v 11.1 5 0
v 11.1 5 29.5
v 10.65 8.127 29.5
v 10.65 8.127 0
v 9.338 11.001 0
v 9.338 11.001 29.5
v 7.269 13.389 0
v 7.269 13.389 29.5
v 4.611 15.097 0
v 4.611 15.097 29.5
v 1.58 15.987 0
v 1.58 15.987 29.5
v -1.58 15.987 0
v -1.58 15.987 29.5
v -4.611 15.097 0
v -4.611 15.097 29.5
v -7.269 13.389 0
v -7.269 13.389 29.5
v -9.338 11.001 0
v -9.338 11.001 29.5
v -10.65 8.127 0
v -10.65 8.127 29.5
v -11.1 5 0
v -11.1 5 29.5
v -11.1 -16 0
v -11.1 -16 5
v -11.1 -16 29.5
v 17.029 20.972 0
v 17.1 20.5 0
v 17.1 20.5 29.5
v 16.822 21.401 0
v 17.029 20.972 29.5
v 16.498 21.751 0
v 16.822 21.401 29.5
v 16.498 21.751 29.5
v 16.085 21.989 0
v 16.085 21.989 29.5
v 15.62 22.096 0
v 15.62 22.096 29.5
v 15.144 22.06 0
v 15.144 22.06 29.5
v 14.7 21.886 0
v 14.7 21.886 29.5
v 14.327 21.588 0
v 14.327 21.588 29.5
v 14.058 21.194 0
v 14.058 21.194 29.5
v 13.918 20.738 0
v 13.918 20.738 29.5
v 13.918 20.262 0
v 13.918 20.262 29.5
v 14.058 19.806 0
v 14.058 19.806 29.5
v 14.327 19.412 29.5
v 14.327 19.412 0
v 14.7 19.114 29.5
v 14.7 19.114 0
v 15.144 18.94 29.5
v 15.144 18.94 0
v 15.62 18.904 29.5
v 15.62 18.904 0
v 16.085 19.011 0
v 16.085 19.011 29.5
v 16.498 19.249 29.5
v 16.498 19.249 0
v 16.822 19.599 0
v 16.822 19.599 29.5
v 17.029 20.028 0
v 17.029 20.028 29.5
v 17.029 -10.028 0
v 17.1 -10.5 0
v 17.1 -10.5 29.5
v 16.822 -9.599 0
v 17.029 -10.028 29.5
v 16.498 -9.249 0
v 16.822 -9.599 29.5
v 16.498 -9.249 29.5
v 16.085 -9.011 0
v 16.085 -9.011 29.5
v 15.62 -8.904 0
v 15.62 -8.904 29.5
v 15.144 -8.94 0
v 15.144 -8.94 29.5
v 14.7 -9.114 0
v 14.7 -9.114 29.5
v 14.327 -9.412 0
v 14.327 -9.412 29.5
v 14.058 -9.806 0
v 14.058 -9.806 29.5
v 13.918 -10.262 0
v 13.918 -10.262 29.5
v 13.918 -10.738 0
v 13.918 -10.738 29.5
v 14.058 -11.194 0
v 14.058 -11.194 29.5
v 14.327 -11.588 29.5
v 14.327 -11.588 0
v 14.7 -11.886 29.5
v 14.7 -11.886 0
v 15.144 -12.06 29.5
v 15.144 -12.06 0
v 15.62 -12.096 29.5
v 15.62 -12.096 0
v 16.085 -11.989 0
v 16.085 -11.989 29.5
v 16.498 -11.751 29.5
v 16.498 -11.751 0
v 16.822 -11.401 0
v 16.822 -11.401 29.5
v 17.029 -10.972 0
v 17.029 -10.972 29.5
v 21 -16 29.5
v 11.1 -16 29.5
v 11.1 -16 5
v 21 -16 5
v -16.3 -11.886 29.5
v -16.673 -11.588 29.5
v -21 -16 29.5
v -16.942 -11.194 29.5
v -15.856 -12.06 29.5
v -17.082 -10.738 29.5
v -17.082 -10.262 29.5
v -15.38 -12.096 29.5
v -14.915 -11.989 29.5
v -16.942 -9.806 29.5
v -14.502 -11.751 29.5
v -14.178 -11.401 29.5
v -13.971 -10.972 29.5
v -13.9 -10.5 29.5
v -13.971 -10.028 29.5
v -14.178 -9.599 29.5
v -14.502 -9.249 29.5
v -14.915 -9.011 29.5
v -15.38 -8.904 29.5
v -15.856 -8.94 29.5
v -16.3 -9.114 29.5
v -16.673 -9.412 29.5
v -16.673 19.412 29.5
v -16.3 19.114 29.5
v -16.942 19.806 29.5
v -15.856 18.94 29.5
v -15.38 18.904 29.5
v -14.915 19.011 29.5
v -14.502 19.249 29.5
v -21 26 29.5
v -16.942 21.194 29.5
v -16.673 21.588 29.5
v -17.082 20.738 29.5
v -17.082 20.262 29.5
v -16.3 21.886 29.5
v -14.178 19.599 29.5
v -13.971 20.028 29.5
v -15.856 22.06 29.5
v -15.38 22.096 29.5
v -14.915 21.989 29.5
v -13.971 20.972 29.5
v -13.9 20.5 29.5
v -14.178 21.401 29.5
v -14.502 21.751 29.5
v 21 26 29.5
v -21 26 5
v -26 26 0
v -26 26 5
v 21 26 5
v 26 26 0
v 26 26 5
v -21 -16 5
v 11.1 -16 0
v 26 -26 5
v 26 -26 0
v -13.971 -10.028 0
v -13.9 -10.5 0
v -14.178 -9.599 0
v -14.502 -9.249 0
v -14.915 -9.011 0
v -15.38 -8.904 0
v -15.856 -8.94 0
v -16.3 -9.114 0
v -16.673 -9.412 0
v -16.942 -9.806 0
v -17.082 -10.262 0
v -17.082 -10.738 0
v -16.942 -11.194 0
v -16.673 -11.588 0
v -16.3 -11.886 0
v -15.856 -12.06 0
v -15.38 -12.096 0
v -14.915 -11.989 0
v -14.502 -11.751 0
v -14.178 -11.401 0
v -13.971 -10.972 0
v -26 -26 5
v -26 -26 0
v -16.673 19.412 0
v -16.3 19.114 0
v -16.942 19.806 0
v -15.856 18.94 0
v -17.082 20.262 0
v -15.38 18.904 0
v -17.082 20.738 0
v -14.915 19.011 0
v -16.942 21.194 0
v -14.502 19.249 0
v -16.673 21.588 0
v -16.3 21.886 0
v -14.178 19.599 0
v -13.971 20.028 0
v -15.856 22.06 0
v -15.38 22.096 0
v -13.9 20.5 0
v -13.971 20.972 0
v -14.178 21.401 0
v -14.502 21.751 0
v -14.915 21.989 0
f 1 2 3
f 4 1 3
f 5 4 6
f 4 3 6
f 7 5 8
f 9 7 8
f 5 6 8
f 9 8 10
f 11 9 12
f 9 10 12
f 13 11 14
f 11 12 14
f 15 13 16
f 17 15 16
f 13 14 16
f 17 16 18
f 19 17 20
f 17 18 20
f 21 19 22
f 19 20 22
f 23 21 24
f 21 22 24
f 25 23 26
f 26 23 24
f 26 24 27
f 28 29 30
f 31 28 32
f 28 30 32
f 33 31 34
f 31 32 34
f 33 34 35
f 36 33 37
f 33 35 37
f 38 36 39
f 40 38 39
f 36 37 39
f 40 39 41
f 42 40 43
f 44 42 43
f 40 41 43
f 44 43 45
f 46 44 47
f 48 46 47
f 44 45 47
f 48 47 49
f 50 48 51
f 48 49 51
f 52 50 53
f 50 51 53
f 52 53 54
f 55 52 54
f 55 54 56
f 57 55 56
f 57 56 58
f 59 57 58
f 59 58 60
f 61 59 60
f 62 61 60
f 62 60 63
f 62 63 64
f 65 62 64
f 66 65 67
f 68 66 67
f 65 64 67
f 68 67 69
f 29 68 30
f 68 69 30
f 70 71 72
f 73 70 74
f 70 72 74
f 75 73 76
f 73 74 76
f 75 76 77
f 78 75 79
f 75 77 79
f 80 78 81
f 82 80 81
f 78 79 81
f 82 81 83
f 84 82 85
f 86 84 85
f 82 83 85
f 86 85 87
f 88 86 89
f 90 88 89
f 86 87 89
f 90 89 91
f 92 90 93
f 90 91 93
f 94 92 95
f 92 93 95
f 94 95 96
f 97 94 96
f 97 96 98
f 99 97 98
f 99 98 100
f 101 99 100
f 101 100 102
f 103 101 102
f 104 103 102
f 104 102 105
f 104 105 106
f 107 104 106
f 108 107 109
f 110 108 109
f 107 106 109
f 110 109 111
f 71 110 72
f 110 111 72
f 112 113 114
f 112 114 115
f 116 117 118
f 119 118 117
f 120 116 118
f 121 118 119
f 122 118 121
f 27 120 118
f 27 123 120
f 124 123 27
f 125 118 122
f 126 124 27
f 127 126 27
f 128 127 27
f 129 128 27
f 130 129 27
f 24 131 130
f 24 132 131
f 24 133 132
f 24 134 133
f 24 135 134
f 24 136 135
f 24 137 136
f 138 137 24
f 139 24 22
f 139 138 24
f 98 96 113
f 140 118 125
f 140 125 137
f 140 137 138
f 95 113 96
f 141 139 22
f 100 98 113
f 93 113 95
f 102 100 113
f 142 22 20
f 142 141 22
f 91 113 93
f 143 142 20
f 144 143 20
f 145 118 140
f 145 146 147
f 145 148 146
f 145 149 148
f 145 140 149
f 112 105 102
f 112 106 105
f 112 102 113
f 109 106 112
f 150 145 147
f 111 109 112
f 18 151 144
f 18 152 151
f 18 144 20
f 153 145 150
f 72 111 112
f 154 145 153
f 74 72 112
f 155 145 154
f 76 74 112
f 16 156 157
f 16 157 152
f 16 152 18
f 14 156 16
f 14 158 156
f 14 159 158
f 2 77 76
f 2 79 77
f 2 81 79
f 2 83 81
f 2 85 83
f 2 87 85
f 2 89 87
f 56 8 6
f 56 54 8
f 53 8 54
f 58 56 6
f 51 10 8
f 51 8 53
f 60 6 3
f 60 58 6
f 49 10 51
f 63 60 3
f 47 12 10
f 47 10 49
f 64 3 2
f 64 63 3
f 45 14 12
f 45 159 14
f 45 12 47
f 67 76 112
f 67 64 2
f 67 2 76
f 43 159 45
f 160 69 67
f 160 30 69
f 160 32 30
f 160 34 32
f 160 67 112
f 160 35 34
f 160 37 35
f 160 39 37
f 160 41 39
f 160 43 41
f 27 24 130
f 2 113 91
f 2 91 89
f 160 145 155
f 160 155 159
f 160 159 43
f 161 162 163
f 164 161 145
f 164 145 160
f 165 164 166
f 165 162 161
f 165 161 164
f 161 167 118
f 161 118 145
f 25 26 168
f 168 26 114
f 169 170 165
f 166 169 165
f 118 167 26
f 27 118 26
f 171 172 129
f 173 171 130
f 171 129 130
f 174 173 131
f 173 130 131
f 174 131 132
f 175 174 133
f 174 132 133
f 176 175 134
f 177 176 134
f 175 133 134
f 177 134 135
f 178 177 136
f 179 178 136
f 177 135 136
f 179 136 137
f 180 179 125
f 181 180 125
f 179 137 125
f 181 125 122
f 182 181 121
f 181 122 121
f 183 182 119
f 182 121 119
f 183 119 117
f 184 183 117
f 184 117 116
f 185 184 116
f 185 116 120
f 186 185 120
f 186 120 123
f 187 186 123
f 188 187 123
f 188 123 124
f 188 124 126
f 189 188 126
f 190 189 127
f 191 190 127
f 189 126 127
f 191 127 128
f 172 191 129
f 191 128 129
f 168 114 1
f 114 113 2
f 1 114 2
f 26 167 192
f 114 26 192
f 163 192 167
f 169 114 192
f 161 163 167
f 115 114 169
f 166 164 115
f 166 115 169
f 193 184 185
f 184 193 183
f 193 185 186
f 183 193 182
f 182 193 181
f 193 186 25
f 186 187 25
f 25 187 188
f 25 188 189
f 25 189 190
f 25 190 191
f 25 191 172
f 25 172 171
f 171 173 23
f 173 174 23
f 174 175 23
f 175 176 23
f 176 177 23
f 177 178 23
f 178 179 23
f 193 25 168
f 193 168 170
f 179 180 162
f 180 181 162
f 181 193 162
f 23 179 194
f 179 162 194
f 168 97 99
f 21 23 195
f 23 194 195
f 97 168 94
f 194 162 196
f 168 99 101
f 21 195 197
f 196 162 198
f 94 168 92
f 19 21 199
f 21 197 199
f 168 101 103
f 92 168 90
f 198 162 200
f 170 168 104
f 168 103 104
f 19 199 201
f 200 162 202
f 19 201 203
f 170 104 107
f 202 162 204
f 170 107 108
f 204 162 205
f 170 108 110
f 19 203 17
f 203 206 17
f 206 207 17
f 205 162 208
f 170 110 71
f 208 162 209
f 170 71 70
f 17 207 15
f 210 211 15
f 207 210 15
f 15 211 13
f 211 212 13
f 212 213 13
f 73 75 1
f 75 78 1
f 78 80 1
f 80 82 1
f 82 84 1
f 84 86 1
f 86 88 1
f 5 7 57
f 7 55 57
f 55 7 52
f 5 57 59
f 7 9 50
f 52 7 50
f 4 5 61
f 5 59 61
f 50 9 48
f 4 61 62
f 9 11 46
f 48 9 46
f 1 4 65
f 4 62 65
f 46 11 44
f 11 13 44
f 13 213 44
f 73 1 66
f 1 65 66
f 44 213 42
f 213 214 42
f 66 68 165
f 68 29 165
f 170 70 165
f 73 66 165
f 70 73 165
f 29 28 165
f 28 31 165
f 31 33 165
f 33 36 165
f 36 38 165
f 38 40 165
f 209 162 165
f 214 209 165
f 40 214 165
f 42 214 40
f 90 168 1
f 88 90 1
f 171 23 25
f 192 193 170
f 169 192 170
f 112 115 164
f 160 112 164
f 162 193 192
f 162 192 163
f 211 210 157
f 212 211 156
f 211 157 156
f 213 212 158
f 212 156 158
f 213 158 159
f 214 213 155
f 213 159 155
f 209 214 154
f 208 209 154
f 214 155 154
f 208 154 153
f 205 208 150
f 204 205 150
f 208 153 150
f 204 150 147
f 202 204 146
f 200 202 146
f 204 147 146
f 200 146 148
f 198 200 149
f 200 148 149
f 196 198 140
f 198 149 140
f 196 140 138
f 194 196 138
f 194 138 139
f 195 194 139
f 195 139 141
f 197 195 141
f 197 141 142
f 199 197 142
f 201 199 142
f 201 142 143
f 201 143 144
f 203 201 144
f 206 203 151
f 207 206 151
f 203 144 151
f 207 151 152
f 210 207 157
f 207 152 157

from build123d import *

# Parameters (mm, degrees)
F0_W     = 52
F0_H     = 52
F1_DEPTH = 5
F2_W     = 42
F2_H     = 42
F3_DEPTH = 24.5
F4_R     = 1.6
F5_DEPTH = 29.5


# Not quite as in the source:
# - a feature names something its author has since deleted; it is built from what else it names


with BuildPart() as f1:
    # F0 (on Top) → F1 (new body)
    with BuildSketch(Plane.XY):
        Rectangle(F0_W, F0_H)
    extrude(amount=F1_DEPTH)

    # F2 (on face) → F3 (join)
    with BuildSketch(Plane.XY.offset(5)):
        with Locations((0, 5)):
            Rectangle(F2_W, F2_H)
    extrude(amount=F3_DEPTH)

    # F4 (on face) → F5 (cut, through all)
    with BuildSketch(Plane.XY.offset(29.5)):
        with Locations((-15.5, 20.5)):
            Circle(F4_R)
        with Locations((15.5, 20.5)):
            Circle(F4_R)
        with Locations((-15.5, -10.5)):
            Circle(F4_R)
        with Locations((15.5, -10.5)):
            Circle(F4_R)
        with BuildLine():
            ThreePointArc((-11.1, 5), (0, -6.1), (11.1, 5))
            ThreePointArc((11.1, 5), (0, 16.1), (-11.1, 5))
        make_face()
        with BuildLine():
            Line((11.1, -16), (11.1, 5))
            ThreePointArc((11.1, 5), (0, -6.1), (-11.1, 5))
            Line((-11.1, 5), (-11.1, -16))
            Line((-11.1, -16), (11.1, -16))
        make_face()
    extrude(amount=-F5_DEPTH, mode=Mode.SUBTRACT)


solid = f1.part
